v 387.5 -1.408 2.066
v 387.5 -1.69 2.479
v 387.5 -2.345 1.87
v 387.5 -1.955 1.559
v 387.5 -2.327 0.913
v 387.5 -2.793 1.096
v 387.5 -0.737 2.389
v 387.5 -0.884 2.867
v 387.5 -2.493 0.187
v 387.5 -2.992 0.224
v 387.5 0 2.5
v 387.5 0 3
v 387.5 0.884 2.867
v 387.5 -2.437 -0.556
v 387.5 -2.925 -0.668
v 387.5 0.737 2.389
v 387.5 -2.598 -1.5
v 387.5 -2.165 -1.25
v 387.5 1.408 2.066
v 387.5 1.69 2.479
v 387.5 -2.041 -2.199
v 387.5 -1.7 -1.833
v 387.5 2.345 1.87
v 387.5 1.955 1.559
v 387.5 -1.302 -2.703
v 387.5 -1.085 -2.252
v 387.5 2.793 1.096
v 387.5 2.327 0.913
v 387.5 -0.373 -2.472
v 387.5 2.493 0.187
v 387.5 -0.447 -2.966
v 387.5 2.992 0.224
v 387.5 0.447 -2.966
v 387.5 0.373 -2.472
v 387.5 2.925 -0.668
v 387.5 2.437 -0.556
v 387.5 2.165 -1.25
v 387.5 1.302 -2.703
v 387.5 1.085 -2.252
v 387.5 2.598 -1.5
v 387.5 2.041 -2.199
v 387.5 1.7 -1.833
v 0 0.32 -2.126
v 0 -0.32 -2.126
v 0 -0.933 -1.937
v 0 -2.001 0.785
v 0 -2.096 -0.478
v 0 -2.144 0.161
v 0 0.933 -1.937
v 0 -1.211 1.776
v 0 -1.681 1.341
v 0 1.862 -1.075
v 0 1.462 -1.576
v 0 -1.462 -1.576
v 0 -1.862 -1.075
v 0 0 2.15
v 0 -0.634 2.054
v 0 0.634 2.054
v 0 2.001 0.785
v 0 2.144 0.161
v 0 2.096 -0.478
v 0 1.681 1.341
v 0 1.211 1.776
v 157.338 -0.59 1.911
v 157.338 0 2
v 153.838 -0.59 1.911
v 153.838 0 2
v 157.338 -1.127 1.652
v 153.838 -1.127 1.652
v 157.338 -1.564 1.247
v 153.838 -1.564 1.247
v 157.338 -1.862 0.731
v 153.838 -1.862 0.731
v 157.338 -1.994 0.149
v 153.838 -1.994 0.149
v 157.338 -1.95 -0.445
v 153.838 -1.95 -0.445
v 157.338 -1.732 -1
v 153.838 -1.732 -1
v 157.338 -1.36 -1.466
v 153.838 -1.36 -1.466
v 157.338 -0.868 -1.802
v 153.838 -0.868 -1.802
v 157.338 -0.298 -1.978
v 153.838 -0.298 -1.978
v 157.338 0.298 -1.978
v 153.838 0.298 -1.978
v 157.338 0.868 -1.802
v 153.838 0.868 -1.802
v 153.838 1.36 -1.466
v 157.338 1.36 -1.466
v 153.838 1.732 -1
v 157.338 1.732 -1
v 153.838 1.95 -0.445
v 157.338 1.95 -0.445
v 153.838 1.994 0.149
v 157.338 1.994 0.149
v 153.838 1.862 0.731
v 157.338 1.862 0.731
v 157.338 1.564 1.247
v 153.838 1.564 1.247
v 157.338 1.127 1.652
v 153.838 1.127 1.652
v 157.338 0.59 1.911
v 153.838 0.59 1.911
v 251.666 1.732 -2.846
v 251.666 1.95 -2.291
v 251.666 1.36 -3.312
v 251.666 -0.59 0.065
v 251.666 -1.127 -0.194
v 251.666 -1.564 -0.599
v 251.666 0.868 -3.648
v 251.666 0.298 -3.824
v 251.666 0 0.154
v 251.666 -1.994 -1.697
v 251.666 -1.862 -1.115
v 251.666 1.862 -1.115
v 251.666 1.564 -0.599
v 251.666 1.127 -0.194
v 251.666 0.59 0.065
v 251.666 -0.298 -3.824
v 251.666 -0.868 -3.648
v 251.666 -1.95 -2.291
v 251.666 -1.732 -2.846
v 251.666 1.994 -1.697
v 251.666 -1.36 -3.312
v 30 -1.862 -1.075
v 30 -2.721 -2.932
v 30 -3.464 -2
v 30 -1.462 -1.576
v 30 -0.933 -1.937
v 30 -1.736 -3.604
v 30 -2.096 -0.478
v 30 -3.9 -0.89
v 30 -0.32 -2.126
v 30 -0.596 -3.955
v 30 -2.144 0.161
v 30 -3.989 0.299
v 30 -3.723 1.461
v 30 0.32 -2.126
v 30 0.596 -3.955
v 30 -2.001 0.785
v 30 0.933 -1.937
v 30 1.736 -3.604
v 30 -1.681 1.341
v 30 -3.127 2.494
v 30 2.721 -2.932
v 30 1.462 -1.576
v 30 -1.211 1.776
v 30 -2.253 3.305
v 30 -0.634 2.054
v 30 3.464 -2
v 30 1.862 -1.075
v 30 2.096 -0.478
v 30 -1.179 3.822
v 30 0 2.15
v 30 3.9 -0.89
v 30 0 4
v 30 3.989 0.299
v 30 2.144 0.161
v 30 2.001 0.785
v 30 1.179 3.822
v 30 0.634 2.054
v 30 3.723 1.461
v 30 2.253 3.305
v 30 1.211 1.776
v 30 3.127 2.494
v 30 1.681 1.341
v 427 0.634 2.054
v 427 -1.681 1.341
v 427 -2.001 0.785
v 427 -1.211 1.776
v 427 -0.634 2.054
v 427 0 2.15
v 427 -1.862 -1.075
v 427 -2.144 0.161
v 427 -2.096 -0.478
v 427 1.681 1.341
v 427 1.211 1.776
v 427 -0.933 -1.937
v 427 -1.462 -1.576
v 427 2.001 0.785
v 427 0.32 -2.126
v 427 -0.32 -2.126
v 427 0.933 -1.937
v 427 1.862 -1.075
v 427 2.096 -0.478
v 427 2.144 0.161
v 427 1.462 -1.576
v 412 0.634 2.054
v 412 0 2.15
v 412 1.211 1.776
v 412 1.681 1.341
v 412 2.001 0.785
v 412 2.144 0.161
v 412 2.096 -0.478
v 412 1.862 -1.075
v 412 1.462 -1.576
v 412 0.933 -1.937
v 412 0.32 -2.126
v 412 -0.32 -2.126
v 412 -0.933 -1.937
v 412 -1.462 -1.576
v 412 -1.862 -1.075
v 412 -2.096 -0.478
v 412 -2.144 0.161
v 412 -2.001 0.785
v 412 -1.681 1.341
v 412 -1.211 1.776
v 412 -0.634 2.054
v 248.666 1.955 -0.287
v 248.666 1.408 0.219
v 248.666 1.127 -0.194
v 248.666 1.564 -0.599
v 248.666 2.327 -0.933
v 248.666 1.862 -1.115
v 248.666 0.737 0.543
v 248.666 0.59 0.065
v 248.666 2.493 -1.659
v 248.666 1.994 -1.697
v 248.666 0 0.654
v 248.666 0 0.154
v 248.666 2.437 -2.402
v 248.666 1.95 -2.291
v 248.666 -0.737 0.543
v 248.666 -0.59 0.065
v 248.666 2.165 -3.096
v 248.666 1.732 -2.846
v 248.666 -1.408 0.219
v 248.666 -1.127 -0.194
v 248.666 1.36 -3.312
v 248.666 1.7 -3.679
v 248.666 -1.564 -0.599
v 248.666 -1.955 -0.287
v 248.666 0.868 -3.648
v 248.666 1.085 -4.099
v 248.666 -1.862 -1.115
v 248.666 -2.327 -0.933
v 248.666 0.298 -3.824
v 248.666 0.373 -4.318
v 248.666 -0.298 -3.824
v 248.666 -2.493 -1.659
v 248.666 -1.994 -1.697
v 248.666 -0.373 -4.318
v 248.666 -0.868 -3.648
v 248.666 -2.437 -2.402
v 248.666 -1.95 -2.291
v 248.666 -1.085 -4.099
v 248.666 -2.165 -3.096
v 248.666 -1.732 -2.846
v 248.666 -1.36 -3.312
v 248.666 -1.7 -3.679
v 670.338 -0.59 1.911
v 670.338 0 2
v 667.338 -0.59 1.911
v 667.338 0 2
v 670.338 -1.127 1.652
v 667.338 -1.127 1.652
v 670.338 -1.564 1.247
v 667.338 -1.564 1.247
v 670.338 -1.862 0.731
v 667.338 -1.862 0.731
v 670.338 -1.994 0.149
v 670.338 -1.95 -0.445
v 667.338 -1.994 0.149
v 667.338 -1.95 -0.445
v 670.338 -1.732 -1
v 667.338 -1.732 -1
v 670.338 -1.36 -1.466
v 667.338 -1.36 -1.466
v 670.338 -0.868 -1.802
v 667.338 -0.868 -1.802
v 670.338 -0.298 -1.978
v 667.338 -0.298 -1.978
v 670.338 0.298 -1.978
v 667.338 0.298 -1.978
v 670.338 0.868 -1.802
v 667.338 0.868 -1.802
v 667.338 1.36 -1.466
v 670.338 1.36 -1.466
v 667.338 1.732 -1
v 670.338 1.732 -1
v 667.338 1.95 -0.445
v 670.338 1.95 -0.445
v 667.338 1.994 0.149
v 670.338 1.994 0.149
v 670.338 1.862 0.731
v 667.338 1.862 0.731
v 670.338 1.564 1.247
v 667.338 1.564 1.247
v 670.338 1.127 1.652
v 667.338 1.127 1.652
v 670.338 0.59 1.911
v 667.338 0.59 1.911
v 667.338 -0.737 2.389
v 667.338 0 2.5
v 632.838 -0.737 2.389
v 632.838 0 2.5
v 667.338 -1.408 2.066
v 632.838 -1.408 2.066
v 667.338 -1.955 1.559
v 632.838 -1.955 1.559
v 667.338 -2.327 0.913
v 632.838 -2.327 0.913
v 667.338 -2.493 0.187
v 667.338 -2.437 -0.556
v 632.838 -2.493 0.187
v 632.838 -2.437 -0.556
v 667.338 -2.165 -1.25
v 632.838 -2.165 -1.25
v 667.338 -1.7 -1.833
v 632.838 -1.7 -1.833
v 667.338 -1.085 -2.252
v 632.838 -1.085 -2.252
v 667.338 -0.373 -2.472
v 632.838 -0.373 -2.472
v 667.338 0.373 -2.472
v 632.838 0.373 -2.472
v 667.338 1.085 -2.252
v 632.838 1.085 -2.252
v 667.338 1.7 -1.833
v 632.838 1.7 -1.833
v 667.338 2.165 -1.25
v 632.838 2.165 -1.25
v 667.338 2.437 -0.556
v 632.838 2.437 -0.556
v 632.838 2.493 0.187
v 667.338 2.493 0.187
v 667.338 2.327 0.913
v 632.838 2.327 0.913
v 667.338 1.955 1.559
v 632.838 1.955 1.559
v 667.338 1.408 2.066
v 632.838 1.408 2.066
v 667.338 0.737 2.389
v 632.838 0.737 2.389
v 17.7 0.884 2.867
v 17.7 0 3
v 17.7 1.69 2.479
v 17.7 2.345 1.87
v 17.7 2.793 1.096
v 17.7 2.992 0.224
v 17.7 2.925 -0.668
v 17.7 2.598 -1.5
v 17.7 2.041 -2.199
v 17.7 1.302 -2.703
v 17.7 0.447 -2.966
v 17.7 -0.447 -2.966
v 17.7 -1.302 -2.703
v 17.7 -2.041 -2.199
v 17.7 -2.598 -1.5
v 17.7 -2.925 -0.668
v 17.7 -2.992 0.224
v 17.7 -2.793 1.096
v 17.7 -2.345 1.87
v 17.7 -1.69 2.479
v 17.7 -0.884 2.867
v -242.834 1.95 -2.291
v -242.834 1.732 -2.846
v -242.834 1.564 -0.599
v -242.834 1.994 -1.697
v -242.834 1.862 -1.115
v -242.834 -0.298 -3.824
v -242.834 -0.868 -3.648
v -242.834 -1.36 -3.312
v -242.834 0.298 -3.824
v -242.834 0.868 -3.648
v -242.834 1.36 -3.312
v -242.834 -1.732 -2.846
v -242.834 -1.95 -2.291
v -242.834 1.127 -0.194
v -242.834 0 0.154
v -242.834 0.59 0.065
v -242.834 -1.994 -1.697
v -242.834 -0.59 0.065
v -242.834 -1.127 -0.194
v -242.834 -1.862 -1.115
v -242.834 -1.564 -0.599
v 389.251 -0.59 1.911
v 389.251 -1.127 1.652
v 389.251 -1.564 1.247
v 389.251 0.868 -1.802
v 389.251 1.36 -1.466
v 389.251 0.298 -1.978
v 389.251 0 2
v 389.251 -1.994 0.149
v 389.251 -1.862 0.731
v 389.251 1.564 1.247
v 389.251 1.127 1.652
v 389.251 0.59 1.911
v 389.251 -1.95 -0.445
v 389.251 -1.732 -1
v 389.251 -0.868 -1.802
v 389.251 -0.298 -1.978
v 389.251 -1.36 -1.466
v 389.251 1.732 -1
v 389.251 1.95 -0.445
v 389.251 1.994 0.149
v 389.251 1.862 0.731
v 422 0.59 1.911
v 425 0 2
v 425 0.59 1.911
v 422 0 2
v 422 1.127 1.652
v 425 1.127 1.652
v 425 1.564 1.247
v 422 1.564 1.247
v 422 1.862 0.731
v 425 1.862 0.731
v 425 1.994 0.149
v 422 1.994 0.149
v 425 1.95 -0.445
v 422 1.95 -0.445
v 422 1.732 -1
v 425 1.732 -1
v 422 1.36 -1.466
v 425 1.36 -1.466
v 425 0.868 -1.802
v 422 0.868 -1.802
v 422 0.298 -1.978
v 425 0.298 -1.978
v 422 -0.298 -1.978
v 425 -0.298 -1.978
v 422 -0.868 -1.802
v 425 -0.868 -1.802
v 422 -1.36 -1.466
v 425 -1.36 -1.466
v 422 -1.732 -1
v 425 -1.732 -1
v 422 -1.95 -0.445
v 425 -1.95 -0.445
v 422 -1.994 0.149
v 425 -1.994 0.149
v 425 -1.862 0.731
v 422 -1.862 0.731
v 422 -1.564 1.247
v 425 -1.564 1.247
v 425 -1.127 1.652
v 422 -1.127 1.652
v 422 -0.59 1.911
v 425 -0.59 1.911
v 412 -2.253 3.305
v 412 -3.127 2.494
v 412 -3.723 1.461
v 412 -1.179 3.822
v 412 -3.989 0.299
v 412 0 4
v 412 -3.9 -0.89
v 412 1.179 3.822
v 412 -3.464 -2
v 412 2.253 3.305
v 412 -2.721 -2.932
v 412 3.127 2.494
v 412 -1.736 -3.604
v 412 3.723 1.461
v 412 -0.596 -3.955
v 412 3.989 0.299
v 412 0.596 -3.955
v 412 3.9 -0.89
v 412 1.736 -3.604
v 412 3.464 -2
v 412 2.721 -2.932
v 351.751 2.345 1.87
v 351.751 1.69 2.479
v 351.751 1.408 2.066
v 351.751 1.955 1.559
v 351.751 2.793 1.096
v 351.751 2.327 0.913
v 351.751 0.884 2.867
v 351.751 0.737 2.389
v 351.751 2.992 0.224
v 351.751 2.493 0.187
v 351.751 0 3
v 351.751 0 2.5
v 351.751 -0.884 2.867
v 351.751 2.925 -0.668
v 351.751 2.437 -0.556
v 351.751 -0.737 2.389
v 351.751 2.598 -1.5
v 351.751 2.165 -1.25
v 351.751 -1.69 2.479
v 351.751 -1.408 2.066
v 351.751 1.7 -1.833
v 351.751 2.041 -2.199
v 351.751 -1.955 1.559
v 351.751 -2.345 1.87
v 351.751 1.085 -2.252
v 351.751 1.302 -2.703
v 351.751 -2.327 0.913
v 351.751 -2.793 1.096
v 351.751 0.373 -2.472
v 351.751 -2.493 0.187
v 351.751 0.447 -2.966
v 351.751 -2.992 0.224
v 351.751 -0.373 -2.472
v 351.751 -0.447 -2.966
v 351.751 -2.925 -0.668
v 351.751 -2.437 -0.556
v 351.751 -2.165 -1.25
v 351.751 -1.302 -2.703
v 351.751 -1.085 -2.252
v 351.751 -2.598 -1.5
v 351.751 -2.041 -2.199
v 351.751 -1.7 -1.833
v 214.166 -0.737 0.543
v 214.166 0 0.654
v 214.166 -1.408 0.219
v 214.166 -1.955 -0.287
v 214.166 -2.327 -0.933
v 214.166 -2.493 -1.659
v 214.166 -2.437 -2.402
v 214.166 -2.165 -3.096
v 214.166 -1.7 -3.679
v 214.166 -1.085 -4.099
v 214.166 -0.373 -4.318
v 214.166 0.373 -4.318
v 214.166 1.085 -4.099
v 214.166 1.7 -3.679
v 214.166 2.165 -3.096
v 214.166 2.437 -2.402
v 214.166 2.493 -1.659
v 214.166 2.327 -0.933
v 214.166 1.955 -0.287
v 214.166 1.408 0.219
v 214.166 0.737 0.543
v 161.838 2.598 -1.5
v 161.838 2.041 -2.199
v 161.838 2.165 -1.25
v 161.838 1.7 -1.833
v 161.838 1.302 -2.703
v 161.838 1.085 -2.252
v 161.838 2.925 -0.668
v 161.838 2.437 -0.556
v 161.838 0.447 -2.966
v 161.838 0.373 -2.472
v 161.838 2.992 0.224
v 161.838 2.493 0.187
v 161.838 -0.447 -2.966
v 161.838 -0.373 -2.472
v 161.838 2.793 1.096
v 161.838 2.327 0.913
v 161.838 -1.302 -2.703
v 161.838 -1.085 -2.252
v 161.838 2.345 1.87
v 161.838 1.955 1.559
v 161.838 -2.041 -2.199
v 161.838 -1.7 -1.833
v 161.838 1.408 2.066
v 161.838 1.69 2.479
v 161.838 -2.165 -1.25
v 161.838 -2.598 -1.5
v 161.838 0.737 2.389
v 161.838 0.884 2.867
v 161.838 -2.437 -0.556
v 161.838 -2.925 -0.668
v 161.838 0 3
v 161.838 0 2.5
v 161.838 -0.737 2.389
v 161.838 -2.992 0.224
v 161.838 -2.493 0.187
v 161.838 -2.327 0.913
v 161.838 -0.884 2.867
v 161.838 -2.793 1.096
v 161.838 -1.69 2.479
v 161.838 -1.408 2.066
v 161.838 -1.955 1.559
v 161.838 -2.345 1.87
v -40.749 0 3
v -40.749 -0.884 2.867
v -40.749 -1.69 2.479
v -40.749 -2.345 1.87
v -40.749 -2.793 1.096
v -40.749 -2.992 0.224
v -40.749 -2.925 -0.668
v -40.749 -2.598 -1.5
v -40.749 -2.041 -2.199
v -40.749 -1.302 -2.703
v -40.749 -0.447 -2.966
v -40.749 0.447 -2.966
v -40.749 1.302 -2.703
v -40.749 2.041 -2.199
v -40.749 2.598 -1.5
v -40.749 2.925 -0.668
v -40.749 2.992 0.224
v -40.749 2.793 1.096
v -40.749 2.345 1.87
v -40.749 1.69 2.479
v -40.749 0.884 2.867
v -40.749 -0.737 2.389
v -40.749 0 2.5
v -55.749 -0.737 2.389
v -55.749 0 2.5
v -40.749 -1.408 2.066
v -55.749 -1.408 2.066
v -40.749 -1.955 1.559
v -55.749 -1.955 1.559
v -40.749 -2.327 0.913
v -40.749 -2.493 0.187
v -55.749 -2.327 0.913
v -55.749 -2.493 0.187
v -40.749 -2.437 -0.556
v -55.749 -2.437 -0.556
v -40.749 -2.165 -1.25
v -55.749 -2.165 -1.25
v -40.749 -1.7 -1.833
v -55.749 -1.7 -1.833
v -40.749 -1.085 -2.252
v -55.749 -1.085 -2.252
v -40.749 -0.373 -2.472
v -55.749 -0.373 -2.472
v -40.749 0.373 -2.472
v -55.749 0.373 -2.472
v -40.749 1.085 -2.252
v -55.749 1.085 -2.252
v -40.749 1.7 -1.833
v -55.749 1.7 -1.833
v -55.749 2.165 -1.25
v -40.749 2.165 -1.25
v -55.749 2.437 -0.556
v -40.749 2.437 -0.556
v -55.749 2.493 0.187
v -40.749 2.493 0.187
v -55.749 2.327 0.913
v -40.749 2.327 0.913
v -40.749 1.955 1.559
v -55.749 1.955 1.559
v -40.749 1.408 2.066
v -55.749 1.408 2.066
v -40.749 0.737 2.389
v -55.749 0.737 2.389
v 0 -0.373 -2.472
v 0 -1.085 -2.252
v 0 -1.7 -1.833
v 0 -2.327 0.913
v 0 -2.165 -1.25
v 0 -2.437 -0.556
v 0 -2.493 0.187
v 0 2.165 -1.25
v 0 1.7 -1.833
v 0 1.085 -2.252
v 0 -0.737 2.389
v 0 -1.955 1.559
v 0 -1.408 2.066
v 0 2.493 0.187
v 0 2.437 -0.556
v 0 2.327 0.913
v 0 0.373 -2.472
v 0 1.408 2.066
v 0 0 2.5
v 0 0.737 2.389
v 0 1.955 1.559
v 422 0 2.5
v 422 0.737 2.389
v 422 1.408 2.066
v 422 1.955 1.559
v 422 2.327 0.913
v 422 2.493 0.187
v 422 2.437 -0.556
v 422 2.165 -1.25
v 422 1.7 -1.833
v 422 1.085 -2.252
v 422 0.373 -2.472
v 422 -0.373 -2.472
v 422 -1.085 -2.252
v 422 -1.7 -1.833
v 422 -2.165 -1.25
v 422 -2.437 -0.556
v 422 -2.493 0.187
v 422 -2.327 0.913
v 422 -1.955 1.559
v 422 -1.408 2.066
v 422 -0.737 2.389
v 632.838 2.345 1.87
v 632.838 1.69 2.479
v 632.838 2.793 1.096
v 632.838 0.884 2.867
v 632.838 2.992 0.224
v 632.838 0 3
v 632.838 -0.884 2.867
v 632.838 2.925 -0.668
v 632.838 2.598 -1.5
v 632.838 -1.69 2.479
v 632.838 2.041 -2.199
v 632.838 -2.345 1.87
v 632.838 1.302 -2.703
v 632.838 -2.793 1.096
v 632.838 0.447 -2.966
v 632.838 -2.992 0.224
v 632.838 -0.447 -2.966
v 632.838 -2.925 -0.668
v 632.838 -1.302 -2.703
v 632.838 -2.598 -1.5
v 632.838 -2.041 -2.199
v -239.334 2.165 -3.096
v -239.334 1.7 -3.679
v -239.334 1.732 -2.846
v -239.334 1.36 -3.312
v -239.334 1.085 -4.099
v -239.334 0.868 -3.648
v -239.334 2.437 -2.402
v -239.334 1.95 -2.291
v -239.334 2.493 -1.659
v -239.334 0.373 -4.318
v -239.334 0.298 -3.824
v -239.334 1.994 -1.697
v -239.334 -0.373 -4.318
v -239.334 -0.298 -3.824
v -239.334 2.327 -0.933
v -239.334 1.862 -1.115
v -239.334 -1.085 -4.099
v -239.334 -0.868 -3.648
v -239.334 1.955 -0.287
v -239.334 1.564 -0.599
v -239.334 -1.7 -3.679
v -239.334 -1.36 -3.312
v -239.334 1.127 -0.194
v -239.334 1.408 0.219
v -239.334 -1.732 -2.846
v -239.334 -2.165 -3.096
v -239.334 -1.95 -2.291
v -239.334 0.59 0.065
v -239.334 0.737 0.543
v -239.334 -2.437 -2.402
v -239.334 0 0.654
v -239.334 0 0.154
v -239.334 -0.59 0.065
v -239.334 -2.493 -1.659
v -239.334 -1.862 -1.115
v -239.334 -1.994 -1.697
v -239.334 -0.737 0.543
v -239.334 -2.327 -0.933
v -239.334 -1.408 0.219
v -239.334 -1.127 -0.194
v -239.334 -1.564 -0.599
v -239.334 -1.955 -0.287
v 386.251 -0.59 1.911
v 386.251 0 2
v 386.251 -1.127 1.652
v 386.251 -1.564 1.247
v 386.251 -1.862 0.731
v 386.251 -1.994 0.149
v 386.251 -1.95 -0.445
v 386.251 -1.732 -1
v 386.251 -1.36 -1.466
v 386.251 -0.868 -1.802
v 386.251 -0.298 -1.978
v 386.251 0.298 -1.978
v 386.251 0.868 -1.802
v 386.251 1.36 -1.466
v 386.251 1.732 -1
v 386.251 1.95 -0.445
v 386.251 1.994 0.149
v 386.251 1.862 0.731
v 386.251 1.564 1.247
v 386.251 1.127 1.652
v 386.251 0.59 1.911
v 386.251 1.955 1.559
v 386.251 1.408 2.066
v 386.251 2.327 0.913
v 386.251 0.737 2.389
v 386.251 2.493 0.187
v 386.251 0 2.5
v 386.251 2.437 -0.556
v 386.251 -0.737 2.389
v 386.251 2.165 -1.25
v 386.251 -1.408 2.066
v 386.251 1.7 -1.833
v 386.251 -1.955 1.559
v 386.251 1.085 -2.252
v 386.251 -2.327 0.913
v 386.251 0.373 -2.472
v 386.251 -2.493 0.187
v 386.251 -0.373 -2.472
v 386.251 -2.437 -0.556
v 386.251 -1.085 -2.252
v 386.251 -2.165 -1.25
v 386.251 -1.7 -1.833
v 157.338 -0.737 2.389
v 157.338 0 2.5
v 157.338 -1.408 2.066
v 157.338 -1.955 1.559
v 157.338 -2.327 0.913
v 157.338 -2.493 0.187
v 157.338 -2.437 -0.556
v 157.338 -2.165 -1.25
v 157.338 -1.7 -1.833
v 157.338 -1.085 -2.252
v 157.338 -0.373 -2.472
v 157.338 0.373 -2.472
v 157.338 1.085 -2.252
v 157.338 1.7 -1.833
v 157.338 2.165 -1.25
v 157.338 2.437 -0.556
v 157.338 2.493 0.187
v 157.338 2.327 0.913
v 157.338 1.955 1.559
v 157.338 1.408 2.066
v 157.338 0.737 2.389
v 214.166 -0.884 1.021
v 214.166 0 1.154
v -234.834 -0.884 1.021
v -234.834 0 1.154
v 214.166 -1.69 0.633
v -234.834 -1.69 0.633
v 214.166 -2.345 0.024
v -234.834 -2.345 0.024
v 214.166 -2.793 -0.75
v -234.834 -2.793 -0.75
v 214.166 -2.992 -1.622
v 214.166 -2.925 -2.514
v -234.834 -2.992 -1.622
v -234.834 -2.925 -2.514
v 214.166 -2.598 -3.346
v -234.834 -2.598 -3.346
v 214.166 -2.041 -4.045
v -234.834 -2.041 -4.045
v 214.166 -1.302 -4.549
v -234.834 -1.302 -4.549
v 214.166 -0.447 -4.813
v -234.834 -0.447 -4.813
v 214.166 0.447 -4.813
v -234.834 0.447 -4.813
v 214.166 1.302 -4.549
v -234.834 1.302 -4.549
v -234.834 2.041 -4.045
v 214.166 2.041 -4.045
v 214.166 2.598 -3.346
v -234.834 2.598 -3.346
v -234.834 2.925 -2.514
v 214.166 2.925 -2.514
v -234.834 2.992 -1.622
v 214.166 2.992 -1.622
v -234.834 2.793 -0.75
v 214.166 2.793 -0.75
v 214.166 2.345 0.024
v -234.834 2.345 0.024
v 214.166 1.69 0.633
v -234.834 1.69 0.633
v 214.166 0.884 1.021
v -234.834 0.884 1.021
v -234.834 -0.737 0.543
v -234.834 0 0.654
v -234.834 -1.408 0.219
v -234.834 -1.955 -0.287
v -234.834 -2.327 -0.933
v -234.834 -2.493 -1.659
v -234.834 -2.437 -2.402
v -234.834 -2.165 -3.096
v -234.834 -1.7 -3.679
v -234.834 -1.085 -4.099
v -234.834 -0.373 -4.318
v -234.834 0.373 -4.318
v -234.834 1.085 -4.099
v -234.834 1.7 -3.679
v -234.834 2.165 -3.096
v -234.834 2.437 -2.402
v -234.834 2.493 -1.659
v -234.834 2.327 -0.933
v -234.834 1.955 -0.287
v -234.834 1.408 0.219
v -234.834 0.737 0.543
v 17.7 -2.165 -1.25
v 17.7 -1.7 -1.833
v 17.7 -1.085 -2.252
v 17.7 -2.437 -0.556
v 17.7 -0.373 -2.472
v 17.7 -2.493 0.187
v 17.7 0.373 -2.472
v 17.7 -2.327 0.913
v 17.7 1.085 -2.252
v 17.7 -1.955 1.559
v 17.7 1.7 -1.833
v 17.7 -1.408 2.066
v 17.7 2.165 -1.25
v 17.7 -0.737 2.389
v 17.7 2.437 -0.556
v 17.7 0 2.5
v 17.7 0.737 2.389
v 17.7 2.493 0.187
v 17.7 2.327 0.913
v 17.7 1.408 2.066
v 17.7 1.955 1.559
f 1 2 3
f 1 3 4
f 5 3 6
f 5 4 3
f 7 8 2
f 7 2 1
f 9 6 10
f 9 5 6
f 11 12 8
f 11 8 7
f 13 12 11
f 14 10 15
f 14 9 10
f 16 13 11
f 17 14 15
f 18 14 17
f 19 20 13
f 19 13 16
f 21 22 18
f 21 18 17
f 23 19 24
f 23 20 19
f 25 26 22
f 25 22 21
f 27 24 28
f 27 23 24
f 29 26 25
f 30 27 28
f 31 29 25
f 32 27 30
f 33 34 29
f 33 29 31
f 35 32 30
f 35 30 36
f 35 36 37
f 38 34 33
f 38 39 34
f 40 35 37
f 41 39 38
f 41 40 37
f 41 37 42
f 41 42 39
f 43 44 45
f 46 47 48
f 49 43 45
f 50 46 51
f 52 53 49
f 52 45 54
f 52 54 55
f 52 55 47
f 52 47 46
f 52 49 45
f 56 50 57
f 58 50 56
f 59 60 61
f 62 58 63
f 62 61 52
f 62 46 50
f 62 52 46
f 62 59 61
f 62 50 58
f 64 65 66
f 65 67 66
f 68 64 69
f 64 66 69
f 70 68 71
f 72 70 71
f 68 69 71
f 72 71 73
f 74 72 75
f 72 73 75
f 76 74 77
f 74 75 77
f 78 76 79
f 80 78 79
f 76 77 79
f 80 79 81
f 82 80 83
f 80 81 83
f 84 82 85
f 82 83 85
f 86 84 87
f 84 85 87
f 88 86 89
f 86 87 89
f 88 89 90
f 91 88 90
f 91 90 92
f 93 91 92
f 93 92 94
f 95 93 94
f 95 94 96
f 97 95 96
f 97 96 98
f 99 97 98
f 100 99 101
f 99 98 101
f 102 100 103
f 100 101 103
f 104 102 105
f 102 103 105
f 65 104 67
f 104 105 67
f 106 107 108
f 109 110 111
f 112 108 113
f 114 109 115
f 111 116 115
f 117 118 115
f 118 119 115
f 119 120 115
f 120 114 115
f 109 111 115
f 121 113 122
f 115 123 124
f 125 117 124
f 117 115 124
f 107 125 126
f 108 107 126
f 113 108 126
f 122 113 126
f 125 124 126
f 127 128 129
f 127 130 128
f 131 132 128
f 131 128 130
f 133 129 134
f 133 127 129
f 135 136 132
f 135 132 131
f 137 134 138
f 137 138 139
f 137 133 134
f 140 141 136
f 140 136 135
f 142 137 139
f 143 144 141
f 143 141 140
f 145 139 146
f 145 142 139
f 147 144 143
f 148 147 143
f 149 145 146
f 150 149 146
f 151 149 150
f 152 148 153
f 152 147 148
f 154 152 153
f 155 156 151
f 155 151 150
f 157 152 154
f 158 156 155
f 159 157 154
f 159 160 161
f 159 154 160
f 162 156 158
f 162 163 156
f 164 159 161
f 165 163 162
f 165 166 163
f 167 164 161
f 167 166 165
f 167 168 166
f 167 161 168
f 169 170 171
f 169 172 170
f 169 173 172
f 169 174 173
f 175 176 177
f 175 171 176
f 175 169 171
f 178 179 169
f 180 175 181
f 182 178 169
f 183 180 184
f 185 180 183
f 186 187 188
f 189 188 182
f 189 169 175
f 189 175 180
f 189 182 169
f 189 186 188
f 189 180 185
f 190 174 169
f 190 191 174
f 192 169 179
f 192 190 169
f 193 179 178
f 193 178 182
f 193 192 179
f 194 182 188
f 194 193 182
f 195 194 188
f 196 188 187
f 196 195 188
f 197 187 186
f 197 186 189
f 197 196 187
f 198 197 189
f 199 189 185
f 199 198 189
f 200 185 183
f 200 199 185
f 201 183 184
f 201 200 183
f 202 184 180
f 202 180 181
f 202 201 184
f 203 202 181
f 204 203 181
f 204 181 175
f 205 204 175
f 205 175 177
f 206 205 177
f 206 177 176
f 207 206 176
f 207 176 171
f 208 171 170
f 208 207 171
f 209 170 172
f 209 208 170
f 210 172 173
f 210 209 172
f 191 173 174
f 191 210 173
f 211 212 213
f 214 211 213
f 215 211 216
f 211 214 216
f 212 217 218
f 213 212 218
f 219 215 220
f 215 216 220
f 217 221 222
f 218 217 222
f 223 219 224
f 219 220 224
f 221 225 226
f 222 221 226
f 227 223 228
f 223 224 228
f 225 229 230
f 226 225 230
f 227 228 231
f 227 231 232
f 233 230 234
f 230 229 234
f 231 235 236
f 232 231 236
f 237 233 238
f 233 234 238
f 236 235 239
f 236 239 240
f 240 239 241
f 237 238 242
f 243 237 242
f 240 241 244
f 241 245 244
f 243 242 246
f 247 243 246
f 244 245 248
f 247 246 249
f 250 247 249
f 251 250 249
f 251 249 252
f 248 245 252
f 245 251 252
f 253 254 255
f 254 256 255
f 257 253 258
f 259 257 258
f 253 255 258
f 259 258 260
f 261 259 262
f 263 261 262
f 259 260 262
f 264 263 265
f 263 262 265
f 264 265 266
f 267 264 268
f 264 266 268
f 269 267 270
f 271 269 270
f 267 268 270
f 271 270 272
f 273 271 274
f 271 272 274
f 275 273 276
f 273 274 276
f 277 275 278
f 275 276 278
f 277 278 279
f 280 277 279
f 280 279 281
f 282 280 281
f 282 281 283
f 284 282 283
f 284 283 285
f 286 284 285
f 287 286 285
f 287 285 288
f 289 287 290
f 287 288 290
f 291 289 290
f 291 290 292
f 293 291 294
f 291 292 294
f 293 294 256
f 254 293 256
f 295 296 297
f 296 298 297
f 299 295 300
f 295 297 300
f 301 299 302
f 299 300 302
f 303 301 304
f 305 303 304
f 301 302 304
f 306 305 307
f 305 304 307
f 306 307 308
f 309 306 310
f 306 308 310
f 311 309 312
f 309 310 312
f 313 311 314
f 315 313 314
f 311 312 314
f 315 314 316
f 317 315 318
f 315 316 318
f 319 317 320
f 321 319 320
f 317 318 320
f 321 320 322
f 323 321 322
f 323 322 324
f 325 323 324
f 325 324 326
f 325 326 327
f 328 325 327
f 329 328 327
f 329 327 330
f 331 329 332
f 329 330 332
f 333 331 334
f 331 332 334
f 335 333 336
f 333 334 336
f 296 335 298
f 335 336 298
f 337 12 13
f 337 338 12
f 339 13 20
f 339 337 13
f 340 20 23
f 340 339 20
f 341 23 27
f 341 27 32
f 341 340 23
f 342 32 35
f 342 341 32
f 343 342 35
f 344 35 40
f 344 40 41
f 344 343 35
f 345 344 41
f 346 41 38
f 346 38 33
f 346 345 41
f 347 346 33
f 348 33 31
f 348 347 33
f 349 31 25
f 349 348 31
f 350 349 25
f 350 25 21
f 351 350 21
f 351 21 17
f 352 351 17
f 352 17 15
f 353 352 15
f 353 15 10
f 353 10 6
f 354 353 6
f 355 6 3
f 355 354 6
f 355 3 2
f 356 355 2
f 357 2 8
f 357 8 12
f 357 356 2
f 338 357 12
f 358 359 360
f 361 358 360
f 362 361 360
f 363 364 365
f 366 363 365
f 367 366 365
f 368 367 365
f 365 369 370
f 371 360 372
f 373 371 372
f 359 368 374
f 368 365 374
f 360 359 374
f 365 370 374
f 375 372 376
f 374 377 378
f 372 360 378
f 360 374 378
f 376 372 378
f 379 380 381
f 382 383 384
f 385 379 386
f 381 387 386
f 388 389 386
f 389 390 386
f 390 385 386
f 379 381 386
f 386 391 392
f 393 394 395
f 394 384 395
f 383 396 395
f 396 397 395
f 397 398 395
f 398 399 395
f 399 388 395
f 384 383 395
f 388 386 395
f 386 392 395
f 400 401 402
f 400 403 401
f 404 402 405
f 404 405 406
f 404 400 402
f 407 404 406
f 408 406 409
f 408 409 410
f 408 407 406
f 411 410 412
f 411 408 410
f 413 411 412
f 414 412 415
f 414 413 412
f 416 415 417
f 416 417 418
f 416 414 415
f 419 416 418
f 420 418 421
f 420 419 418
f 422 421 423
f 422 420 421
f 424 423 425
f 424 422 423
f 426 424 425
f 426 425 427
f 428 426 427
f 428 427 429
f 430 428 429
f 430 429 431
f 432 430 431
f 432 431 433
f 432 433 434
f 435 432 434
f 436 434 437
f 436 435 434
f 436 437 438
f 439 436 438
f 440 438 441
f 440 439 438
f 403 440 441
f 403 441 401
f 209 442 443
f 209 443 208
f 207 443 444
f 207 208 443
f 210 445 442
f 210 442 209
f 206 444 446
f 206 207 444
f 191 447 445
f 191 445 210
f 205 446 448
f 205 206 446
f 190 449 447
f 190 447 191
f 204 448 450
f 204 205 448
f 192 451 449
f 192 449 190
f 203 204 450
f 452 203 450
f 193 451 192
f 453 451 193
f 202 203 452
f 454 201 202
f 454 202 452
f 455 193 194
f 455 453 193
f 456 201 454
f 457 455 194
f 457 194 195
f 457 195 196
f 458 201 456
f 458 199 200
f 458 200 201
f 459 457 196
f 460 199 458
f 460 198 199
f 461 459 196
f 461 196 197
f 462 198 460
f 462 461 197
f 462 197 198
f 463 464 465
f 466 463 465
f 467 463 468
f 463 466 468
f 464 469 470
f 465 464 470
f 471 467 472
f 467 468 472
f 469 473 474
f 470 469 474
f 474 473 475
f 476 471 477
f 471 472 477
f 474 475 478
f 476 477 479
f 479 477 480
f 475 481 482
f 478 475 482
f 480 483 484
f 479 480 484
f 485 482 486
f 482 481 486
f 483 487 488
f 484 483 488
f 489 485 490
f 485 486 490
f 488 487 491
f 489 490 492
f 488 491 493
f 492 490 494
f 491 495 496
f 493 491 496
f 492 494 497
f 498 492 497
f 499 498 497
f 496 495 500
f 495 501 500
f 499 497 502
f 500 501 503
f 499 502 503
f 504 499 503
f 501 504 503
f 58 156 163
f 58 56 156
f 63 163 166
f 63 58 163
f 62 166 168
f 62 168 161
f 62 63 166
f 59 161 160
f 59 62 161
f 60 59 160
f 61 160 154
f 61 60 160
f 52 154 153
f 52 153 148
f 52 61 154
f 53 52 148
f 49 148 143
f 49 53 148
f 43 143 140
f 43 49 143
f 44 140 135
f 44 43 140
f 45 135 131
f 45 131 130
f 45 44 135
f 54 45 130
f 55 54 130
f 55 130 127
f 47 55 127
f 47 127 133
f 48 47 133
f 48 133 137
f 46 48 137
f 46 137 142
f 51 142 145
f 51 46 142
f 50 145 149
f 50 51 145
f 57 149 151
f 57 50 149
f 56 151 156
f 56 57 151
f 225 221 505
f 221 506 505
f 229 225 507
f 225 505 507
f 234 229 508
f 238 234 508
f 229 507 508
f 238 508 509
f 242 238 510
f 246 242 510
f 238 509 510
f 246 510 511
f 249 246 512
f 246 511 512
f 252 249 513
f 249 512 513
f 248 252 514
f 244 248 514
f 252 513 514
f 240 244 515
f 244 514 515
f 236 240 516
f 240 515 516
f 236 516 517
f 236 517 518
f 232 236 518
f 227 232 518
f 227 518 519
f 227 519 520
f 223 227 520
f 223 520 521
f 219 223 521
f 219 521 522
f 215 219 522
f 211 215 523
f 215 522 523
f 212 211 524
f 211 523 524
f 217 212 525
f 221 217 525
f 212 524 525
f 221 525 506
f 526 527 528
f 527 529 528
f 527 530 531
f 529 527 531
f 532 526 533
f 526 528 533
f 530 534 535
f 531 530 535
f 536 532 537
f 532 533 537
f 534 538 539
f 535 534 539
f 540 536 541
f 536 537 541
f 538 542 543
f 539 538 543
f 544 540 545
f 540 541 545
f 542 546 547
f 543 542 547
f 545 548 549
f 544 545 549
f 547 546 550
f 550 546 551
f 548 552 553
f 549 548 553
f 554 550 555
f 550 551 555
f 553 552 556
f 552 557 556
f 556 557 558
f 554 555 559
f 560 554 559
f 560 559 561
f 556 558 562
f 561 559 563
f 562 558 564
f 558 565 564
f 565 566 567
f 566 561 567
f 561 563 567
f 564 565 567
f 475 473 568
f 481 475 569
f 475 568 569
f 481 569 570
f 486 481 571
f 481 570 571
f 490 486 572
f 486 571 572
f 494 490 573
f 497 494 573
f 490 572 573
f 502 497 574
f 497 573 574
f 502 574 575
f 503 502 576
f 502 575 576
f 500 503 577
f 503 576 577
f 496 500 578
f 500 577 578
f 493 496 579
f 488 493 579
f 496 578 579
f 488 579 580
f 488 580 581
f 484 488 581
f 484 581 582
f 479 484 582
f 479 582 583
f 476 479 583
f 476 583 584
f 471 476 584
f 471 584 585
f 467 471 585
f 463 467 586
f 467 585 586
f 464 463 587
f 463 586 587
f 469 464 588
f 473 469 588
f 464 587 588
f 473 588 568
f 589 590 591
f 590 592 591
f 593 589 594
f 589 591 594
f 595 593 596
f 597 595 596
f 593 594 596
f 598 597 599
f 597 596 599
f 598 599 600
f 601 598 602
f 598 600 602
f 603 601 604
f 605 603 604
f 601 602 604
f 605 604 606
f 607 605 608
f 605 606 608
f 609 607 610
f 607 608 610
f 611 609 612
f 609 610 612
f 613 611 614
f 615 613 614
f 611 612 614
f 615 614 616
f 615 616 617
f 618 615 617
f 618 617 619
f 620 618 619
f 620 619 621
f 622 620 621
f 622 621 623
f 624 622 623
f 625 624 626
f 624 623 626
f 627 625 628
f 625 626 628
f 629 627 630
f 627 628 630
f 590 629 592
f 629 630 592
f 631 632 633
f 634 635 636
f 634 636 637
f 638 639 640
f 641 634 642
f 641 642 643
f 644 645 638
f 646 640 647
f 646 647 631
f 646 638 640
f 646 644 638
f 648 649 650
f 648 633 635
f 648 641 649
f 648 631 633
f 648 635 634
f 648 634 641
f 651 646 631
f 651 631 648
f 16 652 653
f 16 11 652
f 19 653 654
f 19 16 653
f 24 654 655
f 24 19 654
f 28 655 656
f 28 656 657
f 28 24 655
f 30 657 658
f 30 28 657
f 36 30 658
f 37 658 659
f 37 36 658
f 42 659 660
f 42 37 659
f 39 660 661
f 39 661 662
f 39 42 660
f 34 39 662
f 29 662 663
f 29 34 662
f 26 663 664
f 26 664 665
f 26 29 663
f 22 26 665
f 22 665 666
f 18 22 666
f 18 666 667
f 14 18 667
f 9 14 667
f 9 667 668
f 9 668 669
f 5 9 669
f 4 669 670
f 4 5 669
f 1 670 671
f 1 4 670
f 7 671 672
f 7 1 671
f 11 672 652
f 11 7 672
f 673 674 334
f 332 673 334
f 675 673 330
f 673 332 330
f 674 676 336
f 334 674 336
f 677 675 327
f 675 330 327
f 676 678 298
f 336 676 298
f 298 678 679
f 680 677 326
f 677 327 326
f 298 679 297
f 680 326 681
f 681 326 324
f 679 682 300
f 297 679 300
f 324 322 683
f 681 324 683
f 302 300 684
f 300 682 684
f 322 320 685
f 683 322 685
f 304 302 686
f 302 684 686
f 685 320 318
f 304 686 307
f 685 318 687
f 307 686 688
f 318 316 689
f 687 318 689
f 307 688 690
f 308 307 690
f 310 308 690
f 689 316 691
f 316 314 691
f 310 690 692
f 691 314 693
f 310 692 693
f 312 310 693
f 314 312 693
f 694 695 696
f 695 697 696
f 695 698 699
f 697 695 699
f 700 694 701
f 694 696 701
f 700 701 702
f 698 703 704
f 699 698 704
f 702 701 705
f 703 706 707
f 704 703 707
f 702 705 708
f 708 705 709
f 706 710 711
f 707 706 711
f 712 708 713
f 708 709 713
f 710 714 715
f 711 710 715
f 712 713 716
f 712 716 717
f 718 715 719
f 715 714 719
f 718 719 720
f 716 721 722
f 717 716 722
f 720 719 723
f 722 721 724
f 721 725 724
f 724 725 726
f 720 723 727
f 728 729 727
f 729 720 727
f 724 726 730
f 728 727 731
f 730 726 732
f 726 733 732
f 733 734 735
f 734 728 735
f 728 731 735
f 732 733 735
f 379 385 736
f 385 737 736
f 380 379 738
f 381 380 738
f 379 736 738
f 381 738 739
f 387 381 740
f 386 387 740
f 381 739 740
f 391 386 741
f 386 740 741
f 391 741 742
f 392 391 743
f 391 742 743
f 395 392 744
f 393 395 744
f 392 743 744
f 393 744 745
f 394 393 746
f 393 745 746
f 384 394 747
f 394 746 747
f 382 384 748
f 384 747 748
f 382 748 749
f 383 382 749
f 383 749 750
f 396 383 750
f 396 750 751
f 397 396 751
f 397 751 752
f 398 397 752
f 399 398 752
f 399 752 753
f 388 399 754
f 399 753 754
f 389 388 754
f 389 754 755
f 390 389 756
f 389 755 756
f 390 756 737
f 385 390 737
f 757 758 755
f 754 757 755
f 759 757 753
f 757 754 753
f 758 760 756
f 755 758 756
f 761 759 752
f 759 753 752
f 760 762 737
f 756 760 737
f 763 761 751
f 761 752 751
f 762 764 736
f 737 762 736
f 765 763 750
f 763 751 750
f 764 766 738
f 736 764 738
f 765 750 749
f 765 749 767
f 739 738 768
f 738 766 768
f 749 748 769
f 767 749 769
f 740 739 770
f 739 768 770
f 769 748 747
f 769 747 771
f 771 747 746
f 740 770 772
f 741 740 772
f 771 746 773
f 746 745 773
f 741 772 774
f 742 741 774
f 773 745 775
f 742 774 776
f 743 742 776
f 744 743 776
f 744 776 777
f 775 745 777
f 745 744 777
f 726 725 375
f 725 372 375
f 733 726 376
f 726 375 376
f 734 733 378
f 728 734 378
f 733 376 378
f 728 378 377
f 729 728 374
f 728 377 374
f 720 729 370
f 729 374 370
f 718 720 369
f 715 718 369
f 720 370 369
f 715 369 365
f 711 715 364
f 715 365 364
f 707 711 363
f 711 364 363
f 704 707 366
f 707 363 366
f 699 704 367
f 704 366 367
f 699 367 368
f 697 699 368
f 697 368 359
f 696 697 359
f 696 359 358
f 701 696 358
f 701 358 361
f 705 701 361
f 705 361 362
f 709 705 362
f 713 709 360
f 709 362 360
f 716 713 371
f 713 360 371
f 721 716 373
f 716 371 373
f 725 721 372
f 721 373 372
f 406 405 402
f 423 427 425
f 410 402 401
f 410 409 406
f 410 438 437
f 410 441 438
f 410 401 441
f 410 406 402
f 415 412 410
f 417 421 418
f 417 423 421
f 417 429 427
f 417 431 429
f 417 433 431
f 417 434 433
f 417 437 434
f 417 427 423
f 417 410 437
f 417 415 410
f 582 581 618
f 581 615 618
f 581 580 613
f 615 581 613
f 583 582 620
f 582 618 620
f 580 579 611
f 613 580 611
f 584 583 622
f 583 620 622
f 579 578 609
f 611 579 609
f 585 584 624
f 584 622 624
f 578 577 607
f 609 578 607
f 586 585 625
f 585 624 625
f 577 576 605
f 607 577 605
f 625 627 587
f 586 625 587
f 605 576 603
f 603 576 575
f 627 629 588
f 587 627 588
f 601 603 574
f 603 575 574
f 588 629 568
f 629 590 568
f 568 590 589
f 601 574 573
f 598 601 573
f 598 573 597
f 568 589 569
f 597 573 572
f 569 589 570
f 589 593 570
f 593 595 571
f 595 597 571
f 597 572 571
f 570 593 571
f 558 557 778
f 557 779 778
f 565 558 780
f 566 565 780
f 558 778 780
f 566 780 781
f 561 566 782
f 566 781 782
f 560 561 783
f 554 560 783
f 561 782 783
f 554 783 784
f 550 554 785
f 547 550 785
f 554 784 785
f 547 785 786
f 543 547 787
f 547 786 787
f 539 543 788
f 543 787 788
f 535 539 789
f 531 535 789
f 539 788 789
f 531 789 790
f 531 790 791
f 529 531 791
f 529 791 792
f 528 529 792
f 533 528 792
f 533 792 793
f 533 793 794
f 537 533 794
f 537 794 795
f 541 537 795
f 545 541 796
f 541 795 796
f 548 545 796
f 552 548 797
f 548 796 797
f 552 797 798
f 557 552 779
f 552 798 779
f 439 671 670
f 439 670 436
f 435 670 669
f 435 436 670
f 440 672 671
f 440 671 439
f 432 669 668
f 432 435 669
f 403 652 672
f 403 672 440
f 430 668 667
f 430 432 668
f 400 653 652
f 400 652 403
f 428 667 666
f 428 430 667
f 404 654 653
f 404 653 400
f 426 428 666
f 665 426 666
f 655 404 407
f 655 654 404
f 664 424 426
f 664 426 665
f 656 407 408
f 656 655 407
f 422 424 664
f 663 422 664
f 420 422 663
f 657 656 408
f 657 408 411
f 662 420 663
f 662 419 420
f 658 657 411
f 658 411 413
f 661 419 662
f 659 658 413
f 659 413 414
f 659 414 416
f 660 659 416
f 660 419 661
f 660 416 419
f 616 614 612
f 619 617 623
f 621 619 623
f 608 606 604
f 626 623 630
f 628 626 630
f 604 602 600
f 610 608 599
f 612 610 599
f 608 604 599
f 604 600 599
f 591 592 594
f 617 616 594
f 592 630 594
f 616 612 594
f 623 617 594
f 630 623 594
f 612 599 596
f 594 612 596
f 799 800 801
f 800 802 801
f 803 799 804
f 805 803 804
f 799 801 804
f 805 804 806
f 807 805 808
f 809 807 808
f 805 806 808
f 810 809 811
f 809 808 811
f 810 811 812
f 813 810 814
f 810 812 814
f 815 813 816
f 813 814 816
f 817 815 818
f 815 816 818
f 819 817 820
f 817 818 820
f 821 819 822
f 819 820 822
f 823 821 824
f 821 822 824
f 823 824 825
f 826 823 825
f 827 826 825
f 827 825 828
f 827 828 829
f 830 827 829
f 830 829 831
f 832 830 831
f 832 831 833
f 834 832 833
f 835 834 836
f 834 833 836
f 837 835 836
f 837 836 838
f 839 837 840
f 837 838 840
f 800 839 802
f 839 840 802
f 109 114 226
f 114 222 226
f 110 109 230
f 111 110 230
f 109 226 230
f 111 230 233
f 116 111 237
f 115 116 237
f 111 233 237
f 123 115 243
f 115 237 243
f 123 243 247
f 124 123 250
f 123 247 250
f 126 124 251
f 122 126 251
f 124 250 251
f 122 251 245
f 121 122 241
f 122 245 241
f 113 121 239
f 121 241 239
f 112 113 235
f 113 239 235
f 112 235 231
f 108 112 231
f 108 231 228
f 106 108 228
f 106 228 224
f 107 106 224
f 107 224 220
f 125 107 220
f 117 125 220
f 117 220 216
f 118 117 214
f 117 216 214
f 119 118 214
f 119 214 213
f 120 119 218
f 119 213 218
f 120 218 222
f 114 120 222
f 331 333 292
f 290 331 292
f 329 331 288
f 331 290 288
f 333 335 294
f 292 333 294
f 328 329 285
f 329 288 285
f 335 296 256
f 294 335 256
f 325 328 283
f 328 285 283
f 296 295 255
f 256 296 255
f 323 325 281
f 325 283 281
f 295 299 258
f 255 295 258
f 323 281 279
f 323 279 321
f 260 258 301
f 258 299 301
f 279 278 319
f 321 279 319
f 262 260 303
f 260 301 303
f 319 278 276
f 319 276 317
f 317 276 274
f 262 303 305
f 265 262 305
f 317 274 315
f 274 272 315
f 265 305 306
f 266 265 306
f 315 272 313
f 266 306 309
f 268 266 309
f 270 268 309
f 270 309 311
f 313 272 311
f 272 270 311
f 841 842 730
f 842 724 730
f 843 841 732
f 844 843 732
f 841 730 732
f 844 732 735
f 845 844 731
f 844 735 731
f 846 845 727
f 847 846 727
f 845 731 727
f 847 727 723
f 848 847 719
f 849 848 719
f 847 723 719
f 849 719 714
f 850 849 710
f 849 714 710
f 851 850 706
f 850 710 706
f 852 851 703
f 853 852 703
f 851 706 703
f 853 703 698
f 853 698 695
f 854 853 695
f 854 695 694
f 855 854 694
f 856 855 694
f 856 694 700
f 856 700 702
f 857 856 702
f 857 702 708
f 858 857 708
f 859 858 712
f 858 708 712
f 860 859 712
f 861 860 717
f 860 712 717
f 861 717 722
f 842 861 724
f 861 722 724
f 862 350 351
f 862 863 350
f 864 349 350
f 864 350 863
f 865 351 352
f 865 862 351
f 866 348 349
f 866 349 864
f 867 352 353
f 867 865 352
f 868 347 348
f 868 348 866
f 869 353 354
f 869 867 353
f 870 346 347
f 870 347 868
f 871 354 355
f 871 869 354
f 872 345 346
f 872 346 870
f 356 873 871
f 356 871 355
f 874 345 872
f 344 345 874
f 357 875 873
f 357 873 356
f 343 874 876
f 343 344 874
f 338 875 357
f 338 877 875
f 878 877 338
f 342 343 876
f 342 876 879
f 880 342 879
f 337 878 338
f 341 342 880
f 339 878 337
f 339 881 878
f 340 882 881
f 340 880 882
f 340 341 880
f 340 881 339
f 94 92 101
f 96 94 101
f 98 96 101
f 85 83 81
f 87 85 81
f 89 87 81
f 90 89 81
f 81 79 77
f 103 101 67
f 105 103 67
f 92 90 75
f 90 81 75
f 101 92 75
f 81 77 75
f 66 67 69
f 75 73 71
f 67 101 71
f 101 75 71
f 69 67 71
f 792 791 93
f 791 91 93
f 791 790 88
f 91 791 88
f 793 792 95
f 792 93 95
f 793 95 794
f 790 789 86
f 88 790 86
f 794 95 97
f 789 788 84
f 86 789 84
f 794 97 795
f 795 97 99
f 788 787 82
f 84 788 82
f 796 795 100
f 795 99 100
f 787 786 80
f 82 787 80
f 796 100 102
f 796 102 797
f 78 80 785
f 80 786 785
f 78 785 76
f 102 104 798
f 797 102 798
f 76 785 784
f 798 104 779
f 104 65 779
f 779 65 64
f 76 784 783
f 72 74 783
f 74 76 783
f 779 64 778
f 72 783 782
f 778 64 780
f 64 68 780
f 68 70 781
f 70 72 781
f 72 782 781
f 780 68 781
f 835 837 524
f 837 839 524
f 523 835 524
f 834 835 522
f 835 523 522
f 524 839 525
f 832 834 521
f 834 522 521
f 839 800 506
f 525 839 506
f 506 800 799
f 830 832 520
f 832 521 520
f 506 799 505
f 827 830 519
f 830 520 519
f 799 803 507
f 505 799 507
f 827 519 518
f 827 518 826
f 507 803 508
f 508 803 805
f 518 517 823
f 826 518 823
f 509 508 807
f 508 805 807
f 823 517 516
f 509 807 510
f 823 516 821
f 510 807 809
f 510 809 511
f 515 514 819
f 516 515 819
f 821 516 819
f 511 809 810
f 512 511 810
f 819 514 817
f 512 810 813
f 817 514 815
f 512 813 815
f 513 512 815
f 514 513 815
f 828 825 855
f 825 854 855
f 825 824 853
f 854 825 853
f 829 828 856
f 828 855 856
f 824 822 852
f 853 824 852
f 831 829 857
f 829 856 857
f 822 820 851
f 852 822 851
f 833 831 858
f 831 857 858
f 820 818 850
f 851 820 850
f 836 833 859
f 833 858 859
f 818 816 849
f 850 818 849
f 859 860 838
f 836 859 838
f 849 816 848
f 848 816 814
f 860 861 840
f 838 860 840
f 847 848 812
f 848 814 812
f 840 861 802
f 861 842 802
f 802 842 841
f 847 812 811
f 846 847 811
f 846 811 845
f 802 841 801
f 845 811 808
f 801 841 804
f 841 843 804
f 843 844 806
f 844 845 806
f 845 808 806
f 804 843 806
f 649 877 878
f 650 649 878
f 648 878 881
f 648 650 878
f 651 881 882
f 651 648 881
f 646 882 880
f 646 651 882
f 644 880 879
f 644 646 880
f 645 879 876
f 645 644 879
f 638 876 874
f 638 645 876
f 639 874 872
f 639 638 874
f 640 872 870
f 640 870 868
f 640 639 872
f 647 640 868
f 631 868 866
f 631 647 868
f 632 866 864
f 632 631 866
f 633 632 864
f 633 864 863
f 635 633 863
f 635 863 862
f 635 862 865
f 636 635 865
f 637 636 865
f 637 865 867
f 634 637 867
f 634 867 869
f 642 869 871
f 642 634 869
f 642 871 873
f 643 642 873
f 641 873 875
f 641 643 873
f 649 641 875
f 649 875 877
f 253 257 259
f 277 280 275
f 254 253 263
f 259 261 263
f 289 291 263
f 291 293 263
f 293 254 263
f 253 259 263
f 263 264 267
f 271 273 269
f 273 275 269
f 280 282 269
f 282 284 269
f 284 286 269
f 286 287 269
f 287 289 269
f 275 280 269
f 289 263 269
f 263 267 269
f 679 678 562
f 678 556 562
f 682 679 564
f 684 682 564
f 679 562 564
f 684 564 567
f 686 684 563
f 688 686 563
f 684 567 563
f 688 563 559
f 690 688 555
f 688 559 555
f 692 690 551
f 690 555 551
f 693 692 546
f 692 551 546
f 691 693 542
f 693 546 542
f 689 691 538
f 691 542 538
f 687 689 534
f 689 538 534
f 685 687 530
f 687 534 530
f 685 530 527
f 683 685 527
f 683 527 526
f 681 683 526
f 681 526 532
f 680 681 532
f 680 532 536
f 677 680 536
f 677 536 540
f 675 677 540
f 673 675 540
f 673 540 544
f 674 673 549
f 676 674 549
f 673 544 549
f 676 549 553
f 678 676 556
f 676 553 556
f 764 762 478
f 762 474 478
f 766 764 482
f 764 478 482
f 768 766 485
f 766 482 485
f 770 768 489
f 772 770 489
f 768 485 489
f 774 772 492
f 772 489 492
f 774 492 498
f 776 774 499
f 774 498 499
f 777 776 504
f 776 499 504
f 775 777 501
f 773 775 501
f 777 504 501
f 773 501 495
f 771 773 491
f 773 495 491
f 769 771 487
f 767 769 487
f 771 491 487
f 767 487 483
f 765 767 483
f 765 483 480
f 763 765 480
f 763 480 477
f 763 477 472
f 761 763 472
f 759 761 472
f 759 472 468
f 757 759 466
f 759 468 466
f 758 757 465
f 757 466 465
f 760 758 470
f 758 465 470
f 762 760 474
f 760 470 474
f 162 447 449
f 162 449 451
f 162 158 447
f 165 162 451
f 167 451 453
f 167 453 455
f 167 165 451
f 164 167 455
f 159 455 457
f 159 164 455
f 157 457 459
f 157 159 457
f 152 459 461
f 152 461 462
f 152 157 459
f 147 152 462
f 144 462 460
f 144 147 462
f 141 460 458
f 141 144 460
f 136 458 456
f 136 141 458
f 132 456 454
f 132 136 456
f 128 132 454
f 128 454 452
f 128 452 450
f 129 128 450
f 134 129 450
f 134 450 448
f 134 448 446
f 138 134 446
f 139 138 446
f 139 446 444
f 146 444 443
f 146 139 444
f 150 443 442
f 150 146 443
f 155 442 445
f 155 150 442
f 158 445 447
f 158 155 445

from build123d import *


with BuildPart() as f1:
    # F0 (on Front) → F1 (revolve)
    with BuildSketch(Plane.XZ):
        Polygon((-55.748958, 2.5), (-55.748958, 0), (389.251042, 0), (389.251042, 2), (386.251042, 2), (386.251042, 2.5), (351.751042, 2.5), (351.751042, 3), (-40.748958, 3), (-40.748958, 2.5), align=None)
    revolve(axis=Axis((166.430052, 0, 0), (1, 0, 0)))


with BuildPart() as f3:
    # F2 (on Front) → F3 (revolve)
    with BuildSketch(Plane.XZ):
        Polygon((153.83767, 2), (153.83767, 0), (670.33767, 0), (670.33767, 2), (667.33767, 2), (667.33767, 2.5), (632.83767, 2.5), (632.83767, 3), (161.83767, 3), (161.83767, 2.5), (157.33767, 2.5), (157.33767, 2), align=None)
    revolve(axis=Axis((412.08767, 0, 0), (1, 0, 0)))


with BuildPart() as f5:
    # F4 (on Front) → F5 (revolve)
    with BuildSketch(Plane.XZ):
        Polygon((0, 2.5), (0, 0), (425, 0), (425, 2), (422, 2), (422, 2.5), (387.5, 2.5), (387.5, 3), (17.7, 3), (17.7, 2.5), align=None)
    revolve(axis=Axis((-79.588096, 0, 0), (-1, 0, 0)))


with BuildPart() as f7:
    # F6 (on Front) → F7 (revolve)
    with BuildSketch(Plane.XZ):
        Polygon((-242.83403, 0.153846), (-242.83403, -1.846154), (251.66597, -1.846154), (251.66597, 0.153846), (248.66597, 0.153846), (248.66597, 0.653846), (214.16597, 0.653846), (214.16597, 1.153846), (-234.83403, 1.153846), (-234.83403, 0.653846), (-239.33403, 0.653846), (-239.33403, 0.153846), align=None)
    revolve(axis=Axis((4.41597, 0, -1.846154), (1, 0, 0)))


with BuildPart() as f9:
    # F8 (on Front) → F9 (revolve)
    with BuildSketch(Plane.XZ):
        Polygon((0, 2.15), (0, 0), (427, 0), (427, 2.15), (412, 2.15), (412, 4), (30, 4), (30, 2.15), align=None)
    revolve(axis=Axis((213.5, 0, 0), (-1, 0, 0)))


solid = Compound([f1.part, f3.part, f5.part, f7.part, f9.part])
